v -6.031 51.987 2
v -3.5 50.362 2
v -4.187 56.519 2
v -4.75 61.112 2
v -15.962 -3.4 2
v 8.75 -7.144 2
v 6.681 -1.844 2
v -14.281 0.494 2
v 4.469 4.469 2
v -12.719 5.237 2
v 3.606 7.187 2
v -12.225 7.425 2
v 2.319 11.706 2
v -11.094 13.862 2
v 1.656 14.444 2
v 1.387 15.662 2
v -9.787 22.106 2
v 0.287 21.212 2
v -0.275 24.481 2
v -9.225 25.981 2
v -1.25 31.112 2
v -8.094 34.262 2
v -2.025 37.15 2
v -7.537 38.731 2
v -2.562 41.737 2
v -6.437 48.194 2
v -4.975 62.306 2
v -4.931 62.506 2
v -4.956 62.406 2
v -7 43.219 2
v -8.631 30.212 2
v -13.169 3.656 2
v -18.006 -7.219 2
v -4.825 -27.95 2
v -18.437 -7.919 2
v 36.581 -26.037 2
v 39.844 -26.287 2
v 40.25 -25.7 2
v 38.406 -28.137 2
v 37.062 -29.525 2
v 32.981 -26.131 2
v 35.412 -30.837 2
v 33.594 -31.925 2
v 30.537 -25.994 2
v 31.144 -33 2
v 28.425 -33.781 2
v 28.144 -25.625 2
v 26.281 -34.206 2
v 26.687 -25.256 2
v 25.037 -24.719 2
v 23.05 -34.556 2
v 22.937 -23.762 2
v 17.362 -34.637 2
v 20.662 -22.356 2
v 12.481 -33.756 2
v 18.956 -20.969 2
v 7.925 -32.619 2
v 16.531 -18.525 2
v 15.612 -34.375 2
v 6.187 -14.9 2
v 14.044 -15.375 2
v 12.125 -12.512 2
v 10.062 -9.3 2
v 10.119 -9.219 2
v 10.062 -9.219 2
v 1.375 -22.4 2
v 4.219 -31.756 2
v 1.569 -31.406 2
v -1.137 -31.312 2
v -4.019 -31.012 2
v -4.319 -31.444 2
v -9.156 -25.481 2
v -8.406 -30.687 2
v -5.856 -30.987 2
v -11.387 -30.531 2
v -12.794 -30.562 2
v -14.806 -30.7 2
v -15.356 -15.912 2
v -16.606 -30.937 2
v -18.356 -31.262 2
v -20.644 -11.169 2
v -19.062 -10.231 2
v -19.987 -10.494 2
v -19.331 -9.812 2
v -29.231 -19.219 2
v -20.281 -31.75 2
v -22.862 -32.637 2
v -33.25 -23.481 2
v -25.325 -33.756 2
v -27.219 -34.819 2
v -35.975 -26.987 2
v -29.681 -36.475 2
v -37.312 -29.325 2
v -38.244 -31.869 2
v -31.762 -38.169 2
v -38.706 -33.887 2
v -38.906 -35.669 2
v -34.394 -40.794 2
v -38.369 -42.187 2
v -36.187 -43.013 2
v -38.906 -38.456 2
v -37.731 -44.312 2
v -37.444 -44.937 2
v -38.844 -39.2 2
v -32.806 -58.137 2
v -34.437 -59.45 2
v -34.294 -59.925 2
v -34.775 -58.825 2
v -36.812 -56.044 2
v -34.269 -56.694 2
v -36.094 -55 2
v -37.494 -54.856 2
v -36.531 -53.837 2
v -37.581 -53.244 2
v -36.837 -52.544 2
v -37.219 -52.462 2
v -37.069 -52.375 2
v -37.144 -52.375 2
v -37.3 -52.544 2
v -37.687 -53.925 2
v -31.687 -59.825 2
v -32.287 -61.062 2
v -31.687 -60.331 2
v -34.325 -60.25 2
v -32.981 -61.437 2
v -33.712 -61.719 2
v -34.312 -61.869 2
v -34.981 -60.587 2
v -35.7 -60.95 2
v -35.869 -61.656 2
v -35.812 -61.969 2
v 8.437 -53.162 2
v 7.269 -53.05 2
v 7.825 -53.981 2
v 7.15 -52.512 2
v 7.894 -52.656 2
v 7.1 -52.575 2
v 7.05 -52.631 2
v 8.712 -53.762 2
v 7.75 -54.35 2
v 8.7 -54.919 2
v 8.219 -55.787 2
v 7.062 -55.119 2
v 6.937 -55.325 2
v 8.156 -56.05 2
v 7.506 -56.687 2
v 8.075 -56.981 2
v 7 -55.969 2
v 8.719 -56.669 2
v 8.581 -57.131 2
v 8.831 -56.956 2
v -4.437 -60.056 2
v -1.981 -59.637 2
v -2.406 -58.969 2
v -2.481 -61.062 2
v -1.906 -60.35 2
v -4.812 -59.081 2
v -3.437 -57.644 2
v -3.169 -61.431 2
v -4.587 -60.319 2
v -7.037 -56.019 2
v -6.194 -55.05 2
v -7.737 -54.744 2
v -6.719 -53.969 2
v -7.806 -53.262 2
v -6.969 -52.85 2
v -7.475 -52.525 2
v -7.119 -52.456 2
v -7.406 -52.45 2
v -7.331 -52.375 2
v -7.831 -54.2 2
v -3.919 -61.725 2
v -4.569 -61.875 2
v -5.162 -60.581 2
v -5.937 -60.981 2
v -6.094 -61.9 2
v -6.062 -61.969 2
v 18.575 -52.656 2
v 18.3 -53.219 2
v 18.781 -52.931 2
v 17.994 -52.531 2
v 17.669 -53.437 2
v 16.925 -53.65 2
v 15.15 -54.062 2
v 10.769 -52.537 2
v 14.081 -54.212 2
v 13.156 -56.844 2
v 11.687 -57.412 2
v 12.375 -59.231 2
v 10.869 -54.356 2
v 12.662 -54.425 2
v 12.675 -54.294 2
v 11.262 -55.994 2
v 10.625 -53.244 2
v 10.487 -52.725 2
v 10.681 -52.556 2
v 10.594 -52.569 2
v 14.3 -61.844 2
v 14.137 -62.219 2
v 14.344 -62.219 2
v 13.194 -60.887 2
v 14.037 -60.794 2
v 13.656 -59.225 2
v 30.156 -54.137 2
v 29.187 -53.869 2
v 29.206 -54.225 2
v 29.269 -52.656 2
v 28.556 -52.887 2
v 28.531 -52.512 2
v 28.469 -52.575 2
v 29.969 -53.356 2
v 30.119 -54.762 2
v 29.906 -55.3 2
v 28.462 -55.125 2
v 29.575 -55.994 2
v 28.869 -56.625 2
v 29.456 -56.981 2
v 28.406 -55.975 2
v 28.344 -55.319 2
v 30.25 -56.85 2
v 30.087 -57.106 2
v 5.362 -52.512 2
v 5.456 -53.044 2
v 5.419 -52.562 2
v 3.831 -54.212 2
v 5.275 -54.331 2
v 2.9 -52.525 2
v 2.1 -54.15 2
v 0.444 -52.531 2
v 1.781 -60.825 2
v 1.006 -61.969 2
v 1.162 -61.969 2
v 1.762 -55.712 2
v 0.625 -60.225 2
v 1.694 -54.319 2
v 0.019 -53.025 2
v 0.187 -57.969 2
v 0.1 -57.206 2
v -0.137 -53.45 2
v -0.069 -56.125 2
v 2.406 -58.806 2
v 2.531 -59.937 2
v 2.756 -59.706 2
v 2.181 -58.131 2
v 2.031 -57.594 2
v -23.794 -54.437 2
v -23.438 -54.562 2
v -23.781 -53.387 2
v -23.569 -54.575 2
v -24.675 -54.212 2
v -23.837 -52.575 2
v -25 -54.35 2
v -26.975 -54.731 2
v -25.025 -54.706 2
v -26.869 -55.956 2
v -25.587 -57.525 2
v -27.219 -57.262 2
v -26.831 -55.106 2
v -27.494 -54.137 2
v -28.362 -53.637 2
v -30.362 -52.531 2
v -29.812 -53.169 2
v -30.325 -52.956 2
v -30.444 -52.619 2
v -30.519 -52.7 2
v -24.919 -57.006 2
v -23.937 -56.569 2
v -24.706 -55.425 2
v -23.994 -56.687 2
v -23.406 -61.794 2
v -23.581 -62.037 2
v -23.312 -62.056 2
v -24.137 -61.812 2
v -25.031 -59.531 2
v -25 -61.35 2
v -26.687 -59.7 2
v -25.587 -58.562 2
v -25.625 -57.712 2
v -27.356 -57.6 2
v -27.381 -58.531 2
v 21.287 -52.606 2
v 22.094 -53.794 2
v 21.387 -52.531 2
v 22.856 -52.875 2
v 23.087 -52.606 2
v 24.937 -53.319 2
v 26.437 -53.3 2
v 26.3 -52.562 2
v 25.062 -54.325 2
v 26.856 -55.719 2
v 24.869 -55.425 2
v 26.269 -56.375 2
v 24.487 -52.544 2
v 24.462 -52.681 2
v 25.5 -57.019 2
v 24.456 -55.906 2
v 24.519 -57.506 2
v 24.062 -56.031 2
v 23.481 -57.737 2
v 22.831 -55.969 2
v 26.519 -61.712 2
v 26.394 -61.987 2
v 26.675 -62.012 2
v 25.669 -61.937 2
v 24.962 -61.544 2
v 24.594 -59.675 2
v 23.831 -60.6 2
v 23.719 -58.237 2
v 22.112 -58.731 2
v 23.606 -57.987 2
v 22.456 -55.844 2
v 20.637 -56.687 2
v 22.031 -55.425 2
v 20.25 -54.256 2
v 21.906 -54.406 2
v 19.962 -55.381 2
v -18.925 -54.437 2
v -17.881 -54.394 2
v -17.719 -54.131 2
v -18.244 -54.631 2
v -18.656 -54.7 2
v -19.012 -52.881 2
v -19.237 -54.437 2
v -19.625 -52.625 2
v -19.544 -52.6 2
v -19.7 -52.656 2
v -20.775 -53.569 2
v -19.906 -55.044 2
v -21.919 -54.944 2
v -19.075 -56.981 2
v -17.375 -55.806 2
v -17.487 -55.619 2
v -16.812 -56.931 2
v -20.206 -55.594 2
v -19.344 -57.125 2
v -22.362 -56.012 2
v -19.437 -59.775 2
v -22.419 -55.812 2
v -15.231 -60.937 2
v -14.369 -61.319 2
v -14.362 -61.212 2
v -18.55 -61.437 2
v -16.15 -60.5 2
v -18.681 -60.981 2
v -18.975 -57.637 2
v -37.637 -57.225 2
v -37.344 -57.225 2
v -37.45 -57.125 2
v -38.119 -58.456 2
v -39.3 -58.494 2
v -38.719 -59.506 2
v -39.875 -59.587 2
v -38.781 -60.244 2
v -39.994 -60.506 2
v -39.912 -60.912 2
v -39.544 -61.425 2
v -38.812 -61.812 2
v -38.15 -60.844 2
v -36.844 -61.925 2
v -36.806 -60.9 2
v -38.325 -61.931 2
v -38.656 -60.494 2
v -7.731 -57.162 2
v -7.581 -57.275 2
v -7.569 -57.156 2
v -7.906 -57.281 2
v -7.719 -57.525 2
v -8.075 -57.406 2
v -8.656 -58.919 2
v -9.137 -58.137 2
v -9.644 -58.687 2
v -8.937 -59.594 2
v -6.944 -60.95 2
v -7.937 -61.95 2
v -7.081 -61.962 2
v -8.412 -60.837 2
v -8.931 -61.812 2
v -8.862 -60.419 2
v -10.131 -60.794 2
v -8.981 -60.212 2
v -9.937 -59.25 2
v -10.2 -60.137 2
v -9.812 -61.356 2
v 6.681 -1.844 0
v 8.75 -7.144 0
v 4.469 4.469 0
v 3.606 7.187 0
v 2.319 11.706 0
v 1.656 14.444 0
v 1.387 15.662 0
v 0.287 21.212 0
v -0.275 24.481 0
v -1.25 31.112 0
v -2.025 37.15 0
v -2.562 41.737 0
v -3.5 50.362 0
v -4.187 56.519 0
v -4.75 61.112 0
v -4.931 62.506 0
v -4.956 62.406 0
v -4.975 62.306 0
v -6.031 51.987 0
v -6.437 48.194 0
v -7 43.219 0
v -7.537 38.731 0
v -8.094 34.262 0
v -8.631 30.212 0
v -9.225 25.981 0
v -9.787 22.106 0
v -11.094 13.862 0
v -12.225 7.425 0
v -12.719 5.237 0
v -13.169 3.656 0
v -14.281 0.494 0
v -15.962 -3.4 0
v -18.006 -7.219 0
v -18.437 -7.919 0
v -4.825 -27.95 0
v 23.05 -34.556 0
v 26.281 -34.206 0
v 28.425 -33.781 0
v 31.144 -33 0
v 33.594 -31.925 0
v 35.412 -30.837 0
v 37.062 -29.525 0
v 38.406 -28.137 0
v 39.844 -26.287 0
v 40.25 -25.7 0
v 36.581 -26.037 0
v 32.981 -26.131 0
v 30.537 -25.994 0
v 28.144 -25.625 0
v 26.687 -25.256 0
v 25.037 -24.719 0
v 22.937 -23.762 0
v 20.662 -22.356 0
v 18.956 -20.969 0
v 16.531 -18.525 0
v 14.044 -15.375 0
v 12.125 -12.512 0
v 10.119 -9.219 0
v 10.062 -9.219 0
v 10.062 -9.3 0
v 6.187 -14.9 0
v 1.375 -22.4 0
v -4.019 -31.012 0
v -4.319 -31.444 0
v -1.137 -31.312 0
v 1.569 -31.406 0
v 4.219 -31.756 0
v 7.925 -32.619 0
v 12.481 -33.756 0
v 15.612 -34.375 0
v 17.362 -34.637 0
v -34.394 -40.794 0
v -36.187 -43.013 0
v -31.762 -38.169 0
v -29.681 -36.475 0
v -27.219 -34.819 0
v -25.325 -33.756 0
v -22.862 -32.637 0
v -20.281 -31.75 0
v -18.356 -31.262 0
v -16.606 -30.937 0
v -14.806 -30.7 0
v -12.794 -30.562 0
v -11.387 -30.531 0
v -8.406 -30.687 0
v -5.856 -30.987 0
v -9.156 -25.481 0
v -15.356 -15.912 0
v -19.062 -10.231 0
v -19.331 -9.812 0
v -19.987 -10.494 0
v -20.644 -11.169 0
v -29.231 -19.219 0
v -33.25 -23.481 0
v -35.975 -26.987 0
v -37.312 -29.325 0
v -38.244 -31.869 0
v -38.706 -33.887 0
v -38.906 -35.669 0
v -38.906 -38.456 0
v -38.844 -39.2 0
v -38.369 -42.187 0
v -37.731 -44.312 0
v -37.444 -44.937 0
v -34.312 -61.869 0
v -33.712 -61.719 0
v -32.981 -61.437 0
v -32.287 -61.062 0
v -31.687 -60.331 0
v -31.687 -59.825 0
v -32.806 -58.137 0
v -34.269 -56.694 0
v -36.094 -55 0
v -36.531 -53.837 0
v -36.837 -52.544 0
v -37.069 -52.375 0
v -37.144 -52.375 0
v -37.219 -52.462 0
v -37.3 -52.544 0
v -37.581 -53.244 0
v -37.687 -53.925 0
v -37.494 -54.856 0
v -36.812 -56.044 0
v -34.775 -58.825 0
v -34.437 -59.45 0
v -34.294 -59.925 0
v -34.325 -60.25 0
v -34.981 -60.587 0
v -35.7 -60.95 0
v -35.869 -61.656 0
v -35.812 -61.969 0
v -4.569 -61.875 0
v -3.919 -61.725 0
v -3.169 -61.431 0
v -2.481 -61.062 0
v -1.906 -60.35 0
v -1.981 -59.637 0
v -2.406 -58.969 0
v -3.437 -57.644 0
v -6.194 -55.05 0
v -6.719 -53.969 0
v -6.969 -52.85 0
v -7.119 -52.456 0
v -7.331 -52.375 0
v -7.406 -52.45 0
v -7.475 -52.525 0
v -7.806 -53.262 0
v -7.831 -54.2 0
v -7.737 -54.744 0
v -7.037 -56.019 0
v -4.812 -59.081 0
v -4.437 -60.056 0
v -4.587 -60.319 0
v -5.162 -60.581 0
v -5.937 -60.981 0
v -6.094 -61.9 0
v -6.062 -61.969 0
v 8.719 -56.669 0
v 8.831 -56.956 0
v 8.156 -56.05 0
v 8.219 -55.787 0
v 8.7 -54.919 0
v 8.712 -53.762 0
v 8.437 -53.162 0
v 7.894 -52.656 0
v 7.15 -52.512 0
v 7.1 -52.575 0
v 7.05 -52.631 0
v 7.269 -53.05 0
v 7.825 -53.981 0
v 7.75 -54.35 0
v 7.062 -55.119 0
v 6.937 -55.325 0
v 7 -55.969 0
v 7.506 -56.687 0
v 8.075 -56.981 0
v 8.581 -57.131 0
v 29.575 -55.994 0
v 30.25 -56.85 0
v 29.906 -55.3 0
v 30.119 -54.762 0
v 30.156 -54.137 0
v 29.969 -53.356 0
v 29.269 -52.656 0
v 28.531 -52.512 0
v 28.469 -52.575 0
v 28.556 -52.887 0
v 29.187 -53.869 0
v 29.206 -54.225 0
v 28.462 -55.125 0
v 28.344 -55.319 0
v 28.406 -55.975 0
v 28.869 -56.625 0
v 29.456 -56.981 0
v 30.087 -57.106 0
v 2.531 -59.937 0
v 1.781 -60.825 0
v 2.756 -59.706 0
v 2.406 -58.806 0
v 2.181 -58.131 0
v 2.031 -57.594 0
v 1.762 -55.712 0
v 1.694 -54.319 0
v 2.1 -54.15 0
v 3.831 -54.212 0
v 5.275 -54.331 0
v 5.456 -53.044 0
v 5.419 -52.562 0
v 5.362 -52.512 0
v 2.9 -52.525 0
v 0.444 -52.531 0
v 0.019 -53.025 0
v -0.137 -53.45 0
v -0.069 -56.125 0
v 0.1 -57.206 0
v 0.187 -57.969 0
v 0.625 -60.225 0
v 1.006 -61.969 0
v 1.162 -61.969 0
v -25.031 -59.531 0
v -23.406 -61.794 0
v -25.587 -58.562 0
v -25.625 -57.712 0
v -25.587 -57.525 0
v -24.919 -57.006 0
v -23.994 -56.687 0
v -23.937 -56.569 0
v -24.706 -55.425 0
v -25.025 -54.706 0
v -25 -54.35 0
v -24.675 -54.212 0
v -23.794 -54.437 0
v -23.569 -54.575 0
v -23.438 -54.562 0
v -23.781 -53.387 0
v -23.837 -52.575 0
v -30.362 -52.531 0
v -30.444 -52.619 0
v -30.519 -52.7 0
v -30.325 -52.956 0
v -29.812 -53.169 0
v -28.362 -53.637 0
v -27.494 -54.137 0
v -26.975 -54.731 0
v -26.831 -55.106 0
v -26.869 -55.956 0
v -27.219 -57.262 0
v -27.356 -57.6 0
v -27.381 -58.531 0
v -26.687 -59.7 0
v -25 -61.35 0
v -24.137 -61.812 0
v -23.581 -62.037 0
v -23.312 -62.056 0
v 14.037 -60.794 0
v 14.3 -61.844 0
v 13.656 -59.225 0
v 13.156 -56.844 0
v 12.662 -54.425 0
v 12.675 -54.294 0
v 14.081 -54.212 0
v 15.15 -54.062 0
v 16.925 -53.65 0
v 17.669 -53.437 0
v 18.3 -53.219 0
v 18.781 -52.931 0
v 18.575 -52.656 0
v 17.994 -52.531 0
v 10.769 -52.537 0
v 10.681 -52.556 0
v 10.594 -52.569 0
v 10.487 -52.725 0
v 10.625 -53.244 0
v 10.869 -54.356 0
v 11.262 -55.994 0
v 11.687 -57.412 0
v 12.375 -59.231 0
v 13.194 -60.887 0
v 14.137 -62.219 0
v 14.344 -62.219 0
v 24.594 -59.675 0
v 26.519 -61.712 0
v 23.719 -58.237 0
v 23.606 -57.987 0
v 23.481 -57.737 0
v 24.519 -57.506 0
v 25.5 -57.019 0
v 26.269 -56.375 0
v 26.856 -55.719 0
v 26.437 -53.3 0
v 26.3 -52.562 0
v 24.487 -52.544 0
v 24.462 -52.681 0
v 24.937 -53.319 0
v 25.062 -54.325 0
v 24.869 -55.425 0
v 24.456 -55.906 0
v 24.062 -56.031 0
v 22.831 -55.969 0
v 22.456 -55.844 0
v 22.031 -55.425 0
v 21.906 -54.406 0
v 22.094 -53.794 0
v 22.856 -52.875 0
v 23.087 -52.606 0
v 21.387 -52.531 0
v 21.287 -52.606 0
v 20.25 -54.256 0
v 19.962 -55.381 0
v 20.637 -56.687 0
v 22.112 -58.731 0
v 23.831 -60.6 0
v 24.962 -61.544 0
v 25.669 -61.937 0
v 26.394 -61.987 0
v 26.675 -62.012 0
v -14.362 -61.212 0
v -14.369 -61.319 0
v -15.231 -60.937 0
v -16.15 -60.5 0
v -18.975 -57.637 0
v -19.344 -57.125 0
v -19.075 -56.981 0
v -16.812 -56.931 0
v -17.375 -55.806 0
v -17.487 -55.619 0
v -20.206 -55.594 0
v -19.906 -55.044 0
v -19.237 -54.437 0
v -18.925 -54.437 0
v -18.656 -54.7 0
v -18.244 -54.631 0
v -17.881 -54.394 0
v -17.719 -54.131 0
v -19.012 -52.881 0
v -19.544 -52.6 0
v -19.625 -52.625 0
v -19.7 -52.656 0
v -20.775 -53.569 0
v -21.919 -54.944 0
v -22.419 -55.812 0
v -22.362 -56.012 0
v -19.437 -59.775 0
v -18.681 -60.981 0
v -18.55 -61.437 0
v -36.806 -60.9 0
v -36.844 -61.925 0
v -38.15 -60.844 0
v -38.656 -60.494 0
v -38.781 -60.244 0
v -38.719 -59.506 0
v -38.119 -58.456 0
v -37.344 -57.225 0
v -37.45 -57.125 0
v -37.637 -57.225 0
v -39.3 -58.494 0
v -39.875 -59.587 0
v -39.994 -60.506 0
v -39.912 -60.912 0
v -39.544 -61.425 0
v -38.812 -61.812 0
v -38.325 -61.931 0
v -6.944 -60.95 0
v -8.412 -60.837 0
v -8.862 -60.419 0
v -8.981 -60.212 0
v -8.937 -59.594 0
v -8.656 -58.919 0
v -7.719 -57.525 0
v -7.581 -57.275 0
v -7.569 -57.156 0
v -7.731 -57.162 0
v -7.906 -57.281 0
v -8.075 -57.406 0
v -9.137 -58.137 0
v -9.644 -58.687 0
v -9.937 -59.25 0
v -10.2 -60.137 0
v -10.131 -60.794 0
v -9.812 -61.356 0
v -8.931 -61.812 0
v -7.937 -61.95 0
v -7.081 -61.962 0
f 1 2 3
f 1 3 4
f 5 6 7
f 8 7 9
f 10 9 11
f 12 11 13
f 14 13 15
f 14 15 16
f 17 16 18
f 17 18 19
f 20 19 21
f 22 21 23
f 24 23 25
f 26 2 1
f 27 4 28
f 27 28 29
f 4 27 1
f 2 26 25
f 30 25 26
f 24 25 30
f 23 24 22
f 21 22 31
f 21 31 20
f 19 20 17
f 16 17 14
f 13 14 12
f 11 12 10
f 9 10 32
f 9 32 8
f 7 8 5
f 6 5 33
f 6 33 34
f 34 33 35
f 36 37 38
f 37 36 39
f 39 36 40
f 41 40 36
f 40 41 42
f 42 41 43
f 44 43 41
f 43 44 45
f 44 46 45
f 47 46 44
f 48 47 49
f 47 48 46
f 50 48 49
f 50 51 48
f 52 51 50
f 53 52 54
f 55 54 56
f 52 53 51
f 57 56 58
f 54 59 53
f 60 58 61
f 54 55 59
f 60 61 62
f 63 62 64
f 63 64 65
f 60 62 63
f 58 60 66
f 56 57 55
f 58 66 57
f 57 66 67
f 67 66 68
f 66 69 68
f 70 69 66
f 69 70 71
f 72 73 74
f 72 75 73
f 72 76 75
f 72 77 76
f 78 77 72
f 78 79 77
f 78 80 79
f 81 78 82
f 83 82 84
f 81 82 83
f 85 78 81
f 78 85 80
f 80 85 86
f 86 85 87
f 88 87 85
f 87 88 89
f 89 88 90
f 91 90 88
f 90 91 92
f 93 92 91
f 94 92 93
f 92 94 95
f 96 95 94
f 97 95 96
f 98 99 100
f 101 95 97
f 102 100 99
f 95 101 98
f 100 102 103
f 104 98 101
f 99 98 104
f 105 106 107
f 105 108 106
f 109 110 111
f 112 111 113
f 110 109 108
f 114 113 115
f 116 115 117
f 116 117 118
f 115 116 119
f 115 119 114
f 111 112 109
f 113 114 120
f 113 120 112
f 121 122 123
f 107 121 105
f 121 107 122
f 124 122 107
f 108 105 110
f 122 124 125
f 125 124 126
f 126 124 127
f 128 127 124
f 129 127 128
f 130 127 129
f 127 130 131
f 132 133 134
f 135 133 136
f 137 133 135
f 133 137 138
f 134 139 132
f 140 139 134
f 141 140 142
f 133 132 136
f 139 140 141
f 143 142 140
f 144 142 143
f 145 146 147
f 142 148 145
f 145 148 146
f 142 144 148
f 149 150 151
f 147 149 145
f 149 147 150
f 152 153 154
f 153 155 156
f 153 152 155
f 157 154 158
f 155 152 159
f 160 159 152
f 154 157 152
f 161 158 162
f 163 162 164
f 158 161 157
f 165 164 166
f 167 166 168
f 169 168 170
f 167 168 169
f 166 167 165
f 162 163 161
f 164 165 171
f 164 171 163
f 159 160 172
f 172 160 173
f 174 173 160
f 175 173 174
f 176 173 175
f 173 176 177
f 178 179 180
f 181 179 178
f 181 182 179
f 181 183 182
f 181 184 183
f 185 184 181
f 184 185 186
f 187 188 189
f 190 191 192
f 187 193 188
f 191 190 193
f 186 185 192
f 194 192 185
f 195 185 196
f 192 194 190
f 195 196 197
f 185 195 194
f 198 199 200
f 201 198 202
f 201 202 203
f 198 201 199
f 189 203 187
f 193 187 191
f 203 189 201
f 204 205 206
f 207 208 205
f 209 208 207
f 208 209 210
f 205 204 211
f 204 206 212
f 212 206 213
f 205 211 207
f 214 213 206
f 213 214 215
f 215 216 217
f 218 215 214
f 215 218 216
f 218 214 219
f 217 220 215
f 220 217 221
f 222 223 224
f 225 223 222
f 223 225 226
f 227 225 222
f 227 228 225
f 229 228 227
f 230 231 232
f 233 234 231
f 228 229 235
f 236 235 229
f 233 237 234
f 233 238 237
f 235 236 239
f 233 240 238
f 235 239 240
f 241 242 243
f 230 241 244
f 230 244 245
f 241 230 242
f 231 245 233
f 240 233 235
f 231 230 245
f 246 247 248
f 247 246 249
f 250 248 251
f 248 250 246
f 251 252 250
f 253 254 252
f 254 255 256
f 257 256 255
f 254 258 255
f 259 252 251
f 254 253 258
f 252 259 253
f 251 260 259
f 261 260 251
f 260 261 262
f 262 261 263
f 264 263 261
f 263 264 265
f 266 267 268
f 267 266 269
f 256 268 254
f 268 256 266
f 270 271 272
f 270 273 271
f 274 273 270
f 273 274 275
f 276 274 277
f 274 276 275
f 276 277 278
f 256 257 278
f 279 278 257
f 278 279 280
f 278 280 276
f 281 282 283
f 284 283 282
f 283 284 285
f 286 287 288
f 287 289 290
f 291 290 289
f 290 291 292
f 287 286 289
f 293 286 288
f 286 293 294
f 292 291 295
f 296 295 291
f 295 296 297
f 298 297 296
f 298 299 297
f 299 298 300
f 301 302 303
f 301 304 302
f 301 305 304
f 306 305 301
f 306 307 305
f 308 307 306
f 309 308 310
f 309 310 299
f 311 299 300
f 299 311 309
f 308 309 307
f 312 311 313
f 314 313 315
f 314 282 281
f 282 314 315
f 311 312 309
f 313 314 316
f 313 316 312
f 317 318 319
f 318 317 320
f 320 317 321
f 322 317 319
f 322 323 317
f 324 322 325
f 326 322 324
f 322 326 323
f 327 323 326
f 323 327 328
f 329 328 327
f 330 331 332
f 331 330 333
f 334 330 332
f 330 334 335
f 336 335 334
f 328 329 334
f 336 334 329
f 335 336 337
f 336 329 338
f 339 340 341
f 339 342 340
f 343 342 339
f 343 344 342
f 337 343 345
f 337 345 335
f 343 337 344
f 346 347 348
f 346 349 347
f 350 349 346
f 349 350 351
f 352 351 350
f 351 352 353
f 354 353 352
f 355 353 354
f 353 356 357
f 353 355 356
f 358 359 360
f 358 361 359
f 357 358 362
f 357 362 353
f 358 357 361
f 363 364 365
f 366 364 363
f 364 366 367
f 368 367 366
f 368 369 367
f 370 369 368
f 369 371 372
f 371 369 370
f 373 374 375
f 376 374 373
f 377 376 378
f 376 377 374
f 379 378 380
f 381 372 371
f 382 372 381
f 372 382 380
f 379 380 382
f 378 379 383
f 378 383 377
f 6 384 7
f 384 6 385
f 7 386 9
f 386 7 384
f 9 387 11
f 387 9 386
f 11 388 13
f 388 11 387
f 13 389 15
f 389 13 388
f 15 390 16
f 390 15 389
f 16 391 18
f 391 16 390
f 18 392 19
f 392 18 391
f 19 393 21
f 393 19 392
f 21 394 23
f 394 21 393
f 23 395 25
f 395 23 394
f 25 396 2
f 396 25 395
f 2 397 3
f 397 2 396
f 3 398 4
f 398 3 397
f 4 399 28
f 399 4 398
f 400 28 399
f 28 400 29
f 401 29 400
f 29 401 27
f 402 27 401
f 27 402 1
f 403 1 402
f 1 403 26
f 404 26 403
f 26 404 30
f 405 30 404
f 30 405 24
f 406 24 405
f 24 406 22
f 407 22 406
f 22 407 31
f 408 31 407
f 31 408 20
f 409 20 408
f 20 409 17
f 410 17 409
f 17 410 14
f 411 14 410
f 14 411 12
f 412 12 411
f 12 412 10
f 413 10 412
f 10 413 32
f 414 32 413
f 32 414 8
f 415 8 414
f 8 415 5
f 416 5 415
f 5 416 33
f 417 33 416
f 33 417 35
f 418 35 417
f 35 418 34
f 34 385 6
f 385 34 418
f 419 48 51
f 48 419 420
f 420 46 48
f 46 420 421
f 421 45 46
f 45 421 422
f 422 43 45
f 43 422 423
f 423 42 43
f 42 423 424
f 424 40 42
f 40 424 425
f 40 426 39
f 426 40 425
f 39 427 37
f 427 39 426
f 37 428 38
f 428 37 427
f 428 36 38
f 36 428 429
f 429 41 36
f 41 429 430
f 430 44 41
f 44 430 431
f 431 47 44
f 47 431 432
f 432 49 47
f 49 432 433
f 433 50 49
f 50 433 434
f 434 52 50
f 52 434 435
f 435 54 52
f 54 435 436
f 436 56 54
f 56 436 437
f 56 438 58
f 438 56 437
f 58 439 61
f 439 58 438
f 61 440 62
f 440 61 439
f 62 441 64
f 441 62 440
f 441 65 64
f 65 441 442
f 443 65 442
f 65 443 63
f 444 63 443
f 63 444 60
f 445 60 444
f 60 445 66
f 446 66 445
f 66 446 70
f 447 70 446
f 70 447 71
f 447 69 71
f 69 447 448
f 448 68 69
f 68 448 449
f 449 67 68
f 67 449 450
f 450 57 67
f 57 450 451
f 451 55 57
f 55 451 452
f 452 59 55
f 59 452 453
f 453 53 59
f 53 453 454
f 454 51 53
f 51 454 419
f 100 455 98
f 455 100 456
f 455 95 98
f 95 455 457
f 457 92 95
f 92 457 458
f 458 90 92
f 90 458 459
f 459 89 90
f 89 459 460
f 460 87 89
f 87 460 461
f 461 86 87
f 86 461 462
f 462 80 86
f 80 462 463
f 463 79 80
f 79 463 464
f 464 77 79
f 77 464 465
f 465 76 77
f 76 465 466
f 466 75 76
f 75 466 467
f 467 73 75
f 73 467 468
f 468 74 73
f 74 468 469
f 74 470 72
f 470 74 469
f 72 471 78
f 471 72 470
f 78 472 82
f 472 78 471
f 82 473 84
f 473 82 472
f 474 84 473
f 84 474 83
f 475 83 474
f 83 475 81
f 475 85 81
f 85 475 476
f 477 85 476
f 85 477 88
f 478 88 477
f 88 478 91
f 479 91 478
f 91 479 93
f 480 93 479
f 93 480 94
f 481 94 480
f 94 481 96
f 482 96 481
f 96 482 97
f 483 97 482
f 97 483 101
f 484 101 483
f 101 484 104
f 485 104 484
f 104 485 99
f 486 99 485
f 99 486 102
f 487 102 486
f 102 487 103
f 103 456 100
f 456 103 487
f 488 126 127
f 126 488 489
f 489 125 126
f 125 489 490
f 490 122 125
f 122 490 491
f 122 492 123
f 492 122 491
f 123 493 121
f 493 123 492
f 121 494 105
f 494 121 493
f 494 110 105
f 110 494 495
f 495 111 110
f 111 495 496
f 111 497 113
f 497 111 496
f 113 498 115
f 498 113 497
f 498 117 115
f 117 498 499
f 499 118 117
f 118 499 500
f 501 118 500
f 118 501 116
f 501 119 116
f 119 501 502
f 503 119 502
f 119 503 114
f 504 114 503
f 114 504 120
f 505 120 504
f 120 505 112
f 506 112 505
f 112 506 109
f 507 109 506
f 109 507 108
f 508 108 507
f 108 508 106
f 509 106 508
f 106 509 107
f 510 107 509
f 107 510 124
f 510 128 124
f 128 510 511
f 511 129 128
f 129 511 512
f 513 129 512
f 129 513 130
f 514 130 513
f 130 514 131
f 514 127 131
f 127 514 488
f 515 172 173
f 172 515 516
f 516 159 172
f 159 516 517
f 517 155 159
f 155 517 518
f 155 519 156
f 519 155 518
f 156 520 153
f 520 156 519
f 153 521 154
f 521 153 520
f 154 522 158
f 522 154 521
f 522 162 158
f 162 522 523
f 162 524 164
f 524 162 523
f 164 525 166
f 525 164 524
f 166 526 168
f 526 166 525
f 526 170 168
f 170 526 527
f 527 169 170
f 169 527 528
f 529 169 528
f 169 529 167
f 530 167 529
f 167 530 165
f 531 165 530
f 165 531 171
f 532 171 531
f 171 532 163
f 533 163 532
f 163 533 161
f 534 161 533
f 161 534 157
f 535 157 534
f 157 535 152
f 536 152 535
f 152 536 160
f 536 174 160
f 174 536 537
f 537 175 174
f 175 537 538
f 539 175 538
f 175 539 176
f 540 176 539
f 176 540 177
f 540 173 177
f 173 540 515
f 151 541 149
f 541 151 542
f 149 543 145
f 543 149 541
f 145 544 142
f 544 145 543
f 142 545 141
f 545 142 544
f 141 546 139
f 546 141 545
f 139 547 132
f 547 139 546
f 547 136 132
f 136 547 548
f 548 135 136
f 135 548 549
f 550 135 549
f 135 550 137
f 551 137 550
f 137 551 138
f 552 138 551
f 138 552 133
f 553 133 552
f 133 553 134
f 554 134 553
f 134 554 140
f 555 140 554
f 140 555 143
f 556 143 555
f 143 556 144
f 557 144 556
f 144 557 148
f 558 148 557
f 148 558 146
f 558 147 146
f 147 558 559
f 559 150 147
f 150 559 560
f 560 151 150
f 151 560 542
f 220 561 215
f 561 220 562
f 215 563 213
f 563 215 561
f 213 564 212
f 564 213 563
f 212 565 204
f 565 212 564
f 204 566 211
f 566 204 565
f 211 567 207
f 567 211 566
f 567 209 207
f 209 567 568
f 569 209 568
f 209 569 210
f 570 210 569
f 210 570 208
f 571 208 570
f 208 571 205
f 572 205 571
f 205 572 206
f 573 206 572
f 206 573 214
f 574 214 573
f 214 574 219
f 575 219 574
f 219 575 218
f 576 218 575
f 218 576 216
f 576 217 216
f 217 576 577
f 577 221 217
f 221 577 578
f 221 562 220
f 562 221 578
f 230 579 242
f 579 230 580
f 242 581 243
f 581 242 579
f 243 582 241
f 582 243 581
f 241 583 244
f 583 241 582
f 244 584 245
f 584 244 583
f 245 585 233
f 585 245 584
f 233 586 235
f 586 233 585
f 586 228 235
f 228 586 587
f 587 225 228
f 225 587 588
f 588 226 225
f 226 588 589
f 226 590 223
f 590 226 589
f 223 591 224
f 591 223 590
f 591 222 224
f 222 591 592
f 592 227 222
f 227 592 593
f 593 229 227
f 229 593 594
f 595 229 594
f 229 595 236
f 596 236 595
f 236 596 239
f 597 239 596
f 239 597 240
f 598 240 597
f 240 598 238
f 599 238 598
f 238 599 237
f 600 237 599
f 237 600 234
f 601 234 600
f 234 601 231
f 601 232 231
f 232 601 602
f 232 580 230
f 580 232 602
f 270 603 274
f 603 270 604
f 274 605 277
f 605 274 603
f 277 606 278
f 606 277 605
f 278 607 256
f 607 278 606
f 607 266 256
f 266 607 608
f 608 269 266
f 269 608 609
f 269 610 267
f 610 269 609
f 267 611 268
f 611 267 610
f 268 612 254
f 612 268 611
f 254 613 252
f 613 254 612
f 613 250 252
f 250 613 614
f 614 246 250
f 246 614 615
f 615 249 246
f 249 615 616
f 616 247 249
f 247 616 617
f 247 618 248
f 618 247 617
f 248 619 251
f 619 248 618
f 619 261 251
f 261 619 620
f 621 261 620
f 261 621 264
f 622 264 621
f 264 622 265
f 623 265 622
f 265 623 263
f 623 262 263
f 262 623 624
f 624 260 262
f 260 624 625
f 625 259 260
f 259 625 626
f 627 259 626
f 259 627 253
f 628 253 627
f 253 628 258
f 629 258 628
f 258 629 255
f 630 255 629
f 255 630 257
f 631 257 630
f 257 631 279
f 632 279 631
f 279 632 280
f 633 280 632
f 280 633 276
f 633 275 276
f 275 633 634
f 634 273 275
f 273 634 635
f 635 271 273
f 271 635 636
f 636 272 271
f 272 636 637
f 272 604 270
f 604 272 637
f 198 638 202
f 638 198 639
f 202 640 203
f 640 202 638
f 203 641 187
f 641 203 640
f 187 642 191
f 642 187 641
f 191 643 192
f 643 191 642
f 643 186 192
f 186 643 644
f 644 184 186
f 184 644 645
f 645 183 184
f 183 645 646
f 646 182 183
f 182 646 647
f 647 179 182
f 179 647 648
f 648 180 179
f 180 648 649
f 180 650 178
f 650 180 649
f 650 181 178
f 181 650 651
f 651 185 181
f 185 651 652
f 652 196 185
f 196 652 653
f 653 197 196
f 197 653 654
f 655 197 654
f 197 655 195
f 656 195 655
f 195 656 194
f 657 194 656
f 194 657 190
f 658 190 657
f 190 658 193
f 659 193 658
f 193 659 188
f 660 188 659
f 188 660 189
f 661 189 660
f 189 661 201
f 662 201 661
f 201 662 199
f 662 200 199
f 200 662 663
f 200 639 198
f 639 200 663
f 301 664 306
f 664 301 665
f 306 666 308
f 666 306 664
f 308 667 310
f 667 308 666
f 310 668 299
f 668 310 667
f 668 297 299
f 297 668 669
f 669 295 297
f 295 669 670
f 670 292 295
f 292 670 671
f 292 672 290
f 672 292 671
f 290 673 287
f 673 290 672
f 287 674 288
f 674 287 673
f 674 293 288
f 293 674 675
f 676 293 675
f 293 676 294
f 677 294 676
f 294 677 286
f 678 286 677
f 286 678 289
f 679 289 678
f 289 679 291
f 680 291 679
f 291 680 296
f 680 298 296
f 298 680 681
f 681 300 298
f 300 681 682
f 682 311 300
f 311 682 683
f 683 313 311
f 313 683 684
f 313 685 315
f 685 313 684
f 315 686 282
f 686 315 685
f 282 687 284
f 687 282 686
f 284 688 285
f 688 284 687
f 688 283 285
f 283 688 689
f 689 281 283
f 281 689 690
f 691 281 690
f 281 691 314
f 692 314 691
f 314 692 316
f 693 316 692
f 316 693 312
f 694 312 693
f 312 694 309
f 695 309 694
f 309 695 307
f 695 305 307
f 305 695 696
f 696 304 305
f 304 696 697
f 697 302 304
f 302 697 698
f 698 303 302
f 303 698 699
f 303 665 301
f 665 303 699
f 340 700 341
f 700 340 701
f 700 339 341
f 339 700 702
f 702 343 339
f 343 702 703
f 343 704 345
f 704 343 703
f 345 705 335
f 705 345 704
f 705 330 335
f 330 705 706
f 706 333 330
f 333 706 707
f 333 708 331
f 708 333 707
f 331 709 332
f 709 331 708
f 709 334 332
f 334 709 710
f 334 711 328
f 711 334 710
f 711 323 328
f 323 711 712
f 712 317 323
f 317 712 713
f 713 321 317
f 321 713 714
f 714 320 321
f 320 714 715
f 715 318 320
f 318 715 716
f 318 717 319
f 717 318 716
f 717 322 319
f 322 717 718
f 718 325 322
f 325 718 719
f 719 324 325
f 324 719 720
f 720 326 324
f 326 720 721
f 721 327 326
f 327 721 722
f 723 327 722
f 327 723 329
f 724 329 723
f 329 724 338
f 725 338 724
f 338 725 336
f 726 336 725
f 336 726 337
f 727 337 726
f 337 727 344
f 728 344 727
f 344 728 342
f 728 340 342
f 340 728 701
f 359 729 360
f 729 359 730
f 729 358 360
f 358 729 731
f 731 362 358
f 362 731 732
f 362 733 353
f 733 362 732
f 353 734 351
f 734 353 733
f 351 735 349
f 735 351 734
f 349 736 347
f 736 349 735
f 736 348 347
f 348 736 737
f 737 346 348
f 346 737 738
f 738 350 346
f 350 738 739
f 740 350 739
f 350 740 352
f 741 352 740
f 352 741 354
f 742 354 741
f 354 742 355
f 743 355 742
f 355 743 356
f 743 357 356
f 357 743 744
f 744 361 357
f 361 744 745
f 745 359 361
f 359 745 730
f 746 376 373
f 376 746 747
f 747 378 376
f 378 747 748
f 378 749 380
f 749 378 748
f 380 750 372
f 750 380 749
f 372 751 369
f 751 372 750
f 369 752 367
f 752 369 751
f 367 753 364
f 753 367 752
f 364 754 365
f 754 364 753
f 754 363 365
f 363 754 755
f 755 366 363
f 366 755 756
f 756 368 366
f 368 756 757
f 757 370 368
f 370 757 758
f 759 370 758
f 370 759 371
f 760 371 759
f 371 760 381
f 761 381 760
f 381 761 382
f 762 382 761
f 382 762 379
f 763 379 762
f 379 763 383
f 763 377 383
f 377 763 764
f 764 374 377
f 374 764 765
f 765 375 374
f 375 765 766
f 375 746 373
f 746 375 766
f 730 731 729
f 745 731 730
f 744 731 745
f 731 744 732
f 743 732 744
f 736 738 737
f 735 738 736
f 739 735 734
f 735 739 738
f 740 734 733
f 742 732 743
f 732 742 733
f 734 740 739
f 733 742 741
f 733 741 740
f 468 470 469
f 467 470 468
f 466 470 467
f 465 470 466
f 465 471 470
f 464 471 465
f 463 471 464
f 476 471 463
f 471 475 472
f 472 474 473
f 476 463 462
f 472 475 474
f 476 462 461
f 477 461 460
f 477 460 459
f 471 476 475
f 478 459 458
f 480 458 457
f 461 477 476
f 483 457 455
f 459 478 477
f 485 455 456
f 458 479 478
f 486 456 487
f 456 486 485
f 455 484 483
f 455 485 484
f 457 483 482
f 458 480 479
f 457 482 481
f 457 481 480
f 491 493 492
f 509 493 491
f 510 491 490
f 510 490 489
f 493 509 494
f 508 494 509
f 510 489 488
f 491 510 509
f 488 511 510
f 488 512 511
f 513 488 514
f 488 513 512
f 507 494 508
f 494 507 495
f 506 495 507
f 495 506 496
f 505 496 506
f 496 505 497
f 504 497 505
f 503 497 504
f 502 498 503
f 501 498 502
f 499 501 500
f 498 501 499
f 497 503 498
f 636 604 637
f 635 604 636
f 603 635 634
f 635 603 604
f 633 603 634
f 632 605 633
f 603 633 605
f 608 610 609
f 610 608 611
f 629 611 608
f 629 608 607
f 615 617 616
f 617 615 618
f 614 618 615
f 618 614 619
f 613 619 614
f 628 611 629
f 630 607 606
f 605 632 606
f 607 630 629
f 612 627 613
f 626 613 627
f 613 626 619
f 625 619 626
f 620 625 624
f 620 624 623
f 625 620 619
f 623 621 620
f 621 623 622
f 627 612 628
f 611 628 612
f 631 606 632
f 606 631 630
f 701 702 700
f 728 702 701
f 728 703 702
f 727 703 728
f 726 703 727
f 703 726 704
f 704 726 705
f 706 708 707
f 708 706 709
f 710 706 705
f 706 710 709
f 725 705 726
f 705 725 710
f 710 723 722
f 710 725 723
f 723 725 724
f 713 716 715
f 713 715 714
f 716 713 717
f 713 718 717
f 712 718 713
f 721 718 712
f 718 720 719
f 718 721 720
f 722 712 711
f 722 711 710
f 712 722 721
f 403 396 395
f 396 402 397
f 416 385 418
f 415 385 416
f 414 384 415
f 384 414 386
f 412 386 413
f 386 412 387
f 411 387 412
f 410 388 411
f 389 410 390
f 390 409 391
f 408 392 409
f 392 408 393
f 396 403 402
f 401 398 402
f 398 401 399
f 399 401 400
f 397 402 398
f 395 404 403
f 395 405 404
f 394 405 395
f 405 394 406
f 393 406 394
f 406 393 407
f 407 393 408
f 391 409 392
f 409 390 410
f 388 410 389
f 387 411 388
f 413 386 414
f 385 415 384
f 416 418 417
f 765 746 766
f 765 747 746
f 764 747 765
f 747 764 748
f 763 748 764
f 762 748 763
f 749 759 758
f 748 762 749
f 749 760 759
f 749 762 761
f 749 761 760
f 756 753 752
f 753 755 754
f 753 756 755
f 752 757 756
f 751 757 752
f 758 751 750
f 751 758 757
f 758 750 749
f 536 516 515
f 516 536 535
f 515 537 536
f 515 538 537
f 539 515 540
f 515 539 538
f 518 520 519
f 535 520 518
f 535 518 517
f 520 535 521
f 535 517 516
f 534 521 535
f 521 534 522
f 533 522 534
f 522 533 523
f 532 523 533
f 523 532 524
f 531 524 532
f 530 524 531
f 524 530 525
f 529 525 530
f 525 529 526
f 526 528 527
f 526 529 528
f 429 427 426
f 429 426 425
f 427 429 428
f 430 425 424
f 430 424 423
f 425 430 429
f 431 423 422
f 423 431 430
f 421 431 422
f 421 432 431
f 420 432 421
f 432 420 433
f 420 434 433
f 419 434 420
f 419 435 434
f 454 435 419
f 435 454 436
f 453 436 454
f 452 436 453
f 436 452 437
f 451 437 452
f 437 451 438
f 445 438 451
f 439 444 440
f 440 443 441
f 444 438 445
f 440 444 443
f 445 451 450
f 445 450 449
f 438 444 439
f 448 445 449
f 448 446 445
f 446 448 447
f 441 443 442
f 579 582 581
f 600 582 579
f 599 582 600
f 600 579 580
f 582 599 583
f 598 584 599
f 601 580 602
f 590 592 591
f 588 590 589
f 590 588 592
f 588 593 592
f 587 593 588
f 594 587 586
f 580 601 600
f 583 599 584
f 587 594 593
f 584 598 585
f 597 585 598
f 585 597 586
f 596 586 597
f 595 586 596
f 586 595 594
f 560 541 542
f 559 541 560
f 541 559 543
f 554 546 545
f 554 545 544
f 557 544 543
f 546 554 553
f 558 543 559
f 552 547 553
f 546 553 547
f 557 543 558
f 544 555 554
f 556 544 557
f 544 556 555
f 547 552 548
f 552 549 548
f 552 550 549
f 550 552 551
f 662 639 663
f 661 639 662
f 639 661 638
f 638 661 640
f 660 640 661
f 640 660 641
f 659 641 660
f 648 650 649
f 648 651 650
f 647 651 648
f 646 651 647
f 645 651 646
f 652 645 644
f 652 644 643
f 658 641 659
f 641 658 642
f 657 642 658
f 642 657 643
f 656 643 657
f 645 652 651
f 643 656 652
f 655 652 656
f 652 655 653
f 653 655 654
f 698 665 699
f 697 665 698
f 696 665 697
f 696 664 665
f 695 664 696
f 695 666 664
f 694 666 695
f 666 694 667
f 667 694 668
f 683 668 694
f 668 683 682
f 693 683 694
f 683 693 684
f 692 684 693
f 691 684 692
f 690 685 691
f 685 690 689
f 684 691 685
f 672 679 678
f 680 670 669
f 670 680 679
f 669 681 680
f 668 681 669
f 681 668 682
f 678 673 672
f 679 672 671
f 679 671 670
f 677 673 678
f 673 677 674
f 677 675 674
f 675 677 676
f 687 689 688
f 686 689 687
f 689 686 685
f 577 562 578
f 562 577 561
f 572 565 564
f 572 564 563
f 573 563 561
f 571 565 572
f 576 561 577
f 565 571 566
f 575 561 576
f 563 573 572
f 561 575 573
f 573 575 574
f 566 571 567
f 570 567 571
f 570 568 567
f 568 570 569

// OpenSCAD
module 95c1186fc4e72d446c21029314d487c5_1()
{
 /* Generated by trace2scad version 20150415
    http://aggregate.org/MAKE/TRACE2SCAD/
    Optimized model has 387/4796 original points
 */
 color([0.48, 0.48, 0.48])
 assign(minx=0) /* polygon minx=39 */
 assign(miny=0) /* polygon miny=45 */
 assign(maxx=12880) /* polygon maxx=12880 */
 assign(maxy=20000) /* polygon maxy=20001 */
 assign(dx=maxx-minx)
 assign(dy=maxy-miny)
 assign(maxd=((dx>dy)?dx:dy))
 scale([1/maxd, 1/maxd, 1])
 translate([-minx-dx/2, -miny-dy/2, 0])
 linear_extrude(height=1, convexity=387)
 union() {
  union() {
   polygon([[5647,19985],[5644,19969],[5475,18318],[5410,17711],[5320,16915],[5234,16197],[5145,15482],[5059,14834],[4964,14157],[4874,13537],[4665,12218],[4484,11188],[4405,10838],[4333,10585],[4155,10079],[3886,9456],[3559,8845],[3490,8733],[5668,5528],[7840,8857],[7509,9705],[7155,10715],[7017,11150],[6811,11873],[6705,12311],[6662,12506],[6486,13394],[6396,13917],[6240,14978],[6116,15944],[6030,16678],[5880,18058],[5770,19043],[5680,19778],[5651,20001]], convexity=6);
   polygon([[8050,8518],[8050,8512],[7430,7616],[6660,6416],[5797,5038],[5749,4969],[6258,4990],[6691,4975],[7115,4919],[7708,4781],[8437,4599],[8938,4500],[9218,4458],[10128,4471],[10645,4527],[10988,4595],[11423,4720],[11815,4892],[12106,5066],[12370,5276],[12585,5498],[12815,5794],[12880,5888],[12293,5834],[11717,5819],[11326,5841],[10943,5900],[10710,5959],[10446,6045],[10110,6198],[9746,6423],[9473,6645],[9085,7036],[8687,7540],[8380,7998],[8059,8525],[8050,8525]], convexity=9);
   polygon([[3242,8321],[3137,8213],[1763,6925],[1120,6243],[684,5682],[470,5308],[321,4901],[247,4578],[215,4293],[215,3847],[225,3728],[301,3250],[403,2910],[449,2810],[650,3118],[937,3473],[1358,3893],[1691,4164],[2085,4429],[2388,4599],[2782,4778],[3195,4920],[3503,4998],[3783,5050],[4071,5088],[4393,5110],[4618,5115],[5095,5090],[5503,5042],[4975,5923],[3983,7454],[3390,8363],[3347,8430]], convexity=7);
   polygon([[485,1606],[472,1593],[427,1481],[410,1372],[441,1223],[550,1033],[876,588],[930,488],[953,412],[948,360],[843,306],[728,248],[701,135],[710,85],[950,101],[1046,125],[1163,170],[1274,230],[1370,347],[1370,428],[1191,698],[957,929],[665,1200],[595,1386],[546,1593],[509,1620],[497,1620]], convexity=8);
   polygon([[5255,1608],[5244,1596],[5191,1478],[5187,1328],[5202,1241],[5314,1037],[5670,547],[5730,391],[5706,349],[5614,307],[5490,243],[5465,96],[5470,85],[5709,100],[5813,124],[5933,171],[6043,230],[6135,344],[6123,458],[6055,565],[5890,777],[5449,1192],[5365,1365],[5325,1544],[5301,1607],[5267,1620]], convexity=8);
   polygon([[6904,1596],[6511,1595],[6443,1516],[6418,1448],[6429,1020],[6456,847],[6470,725],[6540,364],[6601,85],[6626,85],[6725,268],[6845,410],[6881,447],[6825,591],[6789,699],[6765,785],[6722,1086],[6711,1309],[6776,1336],[7053,1326],[7284,1307],[7313,1513],[7307,1590],[7298,1598]], convexity=10);
   polygon([[7576,1588],[7568,1579],[7603,1512],[7692,1363],[7680,1304],[7570,1181],[7550,1148],[7560,1045],[7641,930],[7732,883],[7813,859],[7853,887],[7835,933],[7745,1032],[7755,1074],[7832,1213],[7834,1398],[7790,1494],[7703,1575],[7584,1598]], convexity=10);
   polygon([[11000,1593],[10995,1588],[11009,1538],[11110,1381],[11113,1324],[10994,1180],[10975,1149],[10985,1044],[11059,940],[11153,883],[11254,863],[11280,904],[11172,1041],[11225,1152],[11259,1238],[11265,1338],[11235,1463],[11123,1575],[11005,1598]], convexity=10);
   polygon([[1569,1581],[1557,1568],[1588,1527],[1670,1493],[1902,1418],[2041,1338],[2124,1243],[2147,1183],[2141,1047],[2085,838],[2063,784],[2059,635],[2170,448],[2440,184],[2578,110],[2667,74],[2710,71],[2695,113],[2435,475],[2346,630],[2340,766],[2346,796],[2453,879],[2601,930],[2610,949],[2487,1132],[2436,1247],[2440,1304],[2492,1326],[2633,1290],[2669,1268],[2690,1270],[2635,1458],[2626,1588],[1582,1595]], convexity=13);
   polygon([[8149,1591],[8135,1589],[8118,1564],[8140,1481],[8179,1303],[8242,1041],[8310,814],[8420,523],[8551,258],[8702,45],[8735,45],[8728,105],[8686,273],[8625,524],[8545,905],[8466,1292],[8468,1313],[8693,1326],[8864,1350],[9148,1416],[9267,1450],[9368,1485],[9445,1531],[9412,1575],[9319,1595],[8163,1594]], convexity=9);
   polygon([[9854,1589],[9846,1583],[9680,1319],[9634,1139],[9742,930],[9978,603],[10253,304],[10434,153],[10547,90],[10663,82],[10708,78],[10683,126],[10375,452],[10235,682],[10217,722],[10197,762],[10363,799],[10520,877],[10643,980],[10737,1085],[10670,1472],[10648,1590],[10358,1593],[10354,1571],[10430,1469],[10450,1308],[10419,1132],[10353,1055],[10290,1035],[10093,1045],[10033,1065],[9965,1132],[9945,1295],[9975,1393],[10097,1540],[10134,1583],[9862,1595]], convexity=13);
   polygon([[3300,1580],[3288,1575],[3116,1429],[2933,1209],[2853,1070],[2862,1038],[3330,436],[3451,243],[3472,170],[4141,189],[4142,206],[4003,250],[3856,320],[3404,778],[3345,860],[3388,883],[3750,891],[3660,1071],[3642,1101],[3207,1105],[3255,1193],[3362,1290],[3412,1290],[3455,1248],[3521,1259],[3579,1297],[3605,1339],[3398,1539],[3313,1584]], convexity=12);
   polygon([[433,852],[418,844],[152,641],[60,466],[41,319],[54,254],[113,172],[230,110],[308,91],[545,92],[551,256],[336,265],[255,321],[235,361],[245,479],[341,647],[465,844],[448,860]], convexity=8);
   polygon([[5175,835],[5148,815],[4978,698],[4897,610],[4850,520],[4808,378],[4819,273],[4870,183],[5011,110],[5170,88],[5307,86],[5329,248],[5094,266],[5022,333],[5003,366],[5010,465],[5055,573],[5205,796],[5227,836],[5229,855],[5203,854]], convexity=8);
  }
 }
}

module 95c1186fc4e72d446c21029314d487c5()
{
 /* all layers combined, scaled to within a 1mm cube */
 scale([1, 1, 1/1])
 difference() {
  union() {
   scale([1,1,2]) translate([0,0,-0.5]) 95c1186fc4e72d446c21029314d487c5_1();
  }
  translate([0,0,-2]) cube([2,2,4],center=true);
 }
}

scale([125, 125, 2]) {
	95c1186fc4e72d446c21029314d487c5();
}
